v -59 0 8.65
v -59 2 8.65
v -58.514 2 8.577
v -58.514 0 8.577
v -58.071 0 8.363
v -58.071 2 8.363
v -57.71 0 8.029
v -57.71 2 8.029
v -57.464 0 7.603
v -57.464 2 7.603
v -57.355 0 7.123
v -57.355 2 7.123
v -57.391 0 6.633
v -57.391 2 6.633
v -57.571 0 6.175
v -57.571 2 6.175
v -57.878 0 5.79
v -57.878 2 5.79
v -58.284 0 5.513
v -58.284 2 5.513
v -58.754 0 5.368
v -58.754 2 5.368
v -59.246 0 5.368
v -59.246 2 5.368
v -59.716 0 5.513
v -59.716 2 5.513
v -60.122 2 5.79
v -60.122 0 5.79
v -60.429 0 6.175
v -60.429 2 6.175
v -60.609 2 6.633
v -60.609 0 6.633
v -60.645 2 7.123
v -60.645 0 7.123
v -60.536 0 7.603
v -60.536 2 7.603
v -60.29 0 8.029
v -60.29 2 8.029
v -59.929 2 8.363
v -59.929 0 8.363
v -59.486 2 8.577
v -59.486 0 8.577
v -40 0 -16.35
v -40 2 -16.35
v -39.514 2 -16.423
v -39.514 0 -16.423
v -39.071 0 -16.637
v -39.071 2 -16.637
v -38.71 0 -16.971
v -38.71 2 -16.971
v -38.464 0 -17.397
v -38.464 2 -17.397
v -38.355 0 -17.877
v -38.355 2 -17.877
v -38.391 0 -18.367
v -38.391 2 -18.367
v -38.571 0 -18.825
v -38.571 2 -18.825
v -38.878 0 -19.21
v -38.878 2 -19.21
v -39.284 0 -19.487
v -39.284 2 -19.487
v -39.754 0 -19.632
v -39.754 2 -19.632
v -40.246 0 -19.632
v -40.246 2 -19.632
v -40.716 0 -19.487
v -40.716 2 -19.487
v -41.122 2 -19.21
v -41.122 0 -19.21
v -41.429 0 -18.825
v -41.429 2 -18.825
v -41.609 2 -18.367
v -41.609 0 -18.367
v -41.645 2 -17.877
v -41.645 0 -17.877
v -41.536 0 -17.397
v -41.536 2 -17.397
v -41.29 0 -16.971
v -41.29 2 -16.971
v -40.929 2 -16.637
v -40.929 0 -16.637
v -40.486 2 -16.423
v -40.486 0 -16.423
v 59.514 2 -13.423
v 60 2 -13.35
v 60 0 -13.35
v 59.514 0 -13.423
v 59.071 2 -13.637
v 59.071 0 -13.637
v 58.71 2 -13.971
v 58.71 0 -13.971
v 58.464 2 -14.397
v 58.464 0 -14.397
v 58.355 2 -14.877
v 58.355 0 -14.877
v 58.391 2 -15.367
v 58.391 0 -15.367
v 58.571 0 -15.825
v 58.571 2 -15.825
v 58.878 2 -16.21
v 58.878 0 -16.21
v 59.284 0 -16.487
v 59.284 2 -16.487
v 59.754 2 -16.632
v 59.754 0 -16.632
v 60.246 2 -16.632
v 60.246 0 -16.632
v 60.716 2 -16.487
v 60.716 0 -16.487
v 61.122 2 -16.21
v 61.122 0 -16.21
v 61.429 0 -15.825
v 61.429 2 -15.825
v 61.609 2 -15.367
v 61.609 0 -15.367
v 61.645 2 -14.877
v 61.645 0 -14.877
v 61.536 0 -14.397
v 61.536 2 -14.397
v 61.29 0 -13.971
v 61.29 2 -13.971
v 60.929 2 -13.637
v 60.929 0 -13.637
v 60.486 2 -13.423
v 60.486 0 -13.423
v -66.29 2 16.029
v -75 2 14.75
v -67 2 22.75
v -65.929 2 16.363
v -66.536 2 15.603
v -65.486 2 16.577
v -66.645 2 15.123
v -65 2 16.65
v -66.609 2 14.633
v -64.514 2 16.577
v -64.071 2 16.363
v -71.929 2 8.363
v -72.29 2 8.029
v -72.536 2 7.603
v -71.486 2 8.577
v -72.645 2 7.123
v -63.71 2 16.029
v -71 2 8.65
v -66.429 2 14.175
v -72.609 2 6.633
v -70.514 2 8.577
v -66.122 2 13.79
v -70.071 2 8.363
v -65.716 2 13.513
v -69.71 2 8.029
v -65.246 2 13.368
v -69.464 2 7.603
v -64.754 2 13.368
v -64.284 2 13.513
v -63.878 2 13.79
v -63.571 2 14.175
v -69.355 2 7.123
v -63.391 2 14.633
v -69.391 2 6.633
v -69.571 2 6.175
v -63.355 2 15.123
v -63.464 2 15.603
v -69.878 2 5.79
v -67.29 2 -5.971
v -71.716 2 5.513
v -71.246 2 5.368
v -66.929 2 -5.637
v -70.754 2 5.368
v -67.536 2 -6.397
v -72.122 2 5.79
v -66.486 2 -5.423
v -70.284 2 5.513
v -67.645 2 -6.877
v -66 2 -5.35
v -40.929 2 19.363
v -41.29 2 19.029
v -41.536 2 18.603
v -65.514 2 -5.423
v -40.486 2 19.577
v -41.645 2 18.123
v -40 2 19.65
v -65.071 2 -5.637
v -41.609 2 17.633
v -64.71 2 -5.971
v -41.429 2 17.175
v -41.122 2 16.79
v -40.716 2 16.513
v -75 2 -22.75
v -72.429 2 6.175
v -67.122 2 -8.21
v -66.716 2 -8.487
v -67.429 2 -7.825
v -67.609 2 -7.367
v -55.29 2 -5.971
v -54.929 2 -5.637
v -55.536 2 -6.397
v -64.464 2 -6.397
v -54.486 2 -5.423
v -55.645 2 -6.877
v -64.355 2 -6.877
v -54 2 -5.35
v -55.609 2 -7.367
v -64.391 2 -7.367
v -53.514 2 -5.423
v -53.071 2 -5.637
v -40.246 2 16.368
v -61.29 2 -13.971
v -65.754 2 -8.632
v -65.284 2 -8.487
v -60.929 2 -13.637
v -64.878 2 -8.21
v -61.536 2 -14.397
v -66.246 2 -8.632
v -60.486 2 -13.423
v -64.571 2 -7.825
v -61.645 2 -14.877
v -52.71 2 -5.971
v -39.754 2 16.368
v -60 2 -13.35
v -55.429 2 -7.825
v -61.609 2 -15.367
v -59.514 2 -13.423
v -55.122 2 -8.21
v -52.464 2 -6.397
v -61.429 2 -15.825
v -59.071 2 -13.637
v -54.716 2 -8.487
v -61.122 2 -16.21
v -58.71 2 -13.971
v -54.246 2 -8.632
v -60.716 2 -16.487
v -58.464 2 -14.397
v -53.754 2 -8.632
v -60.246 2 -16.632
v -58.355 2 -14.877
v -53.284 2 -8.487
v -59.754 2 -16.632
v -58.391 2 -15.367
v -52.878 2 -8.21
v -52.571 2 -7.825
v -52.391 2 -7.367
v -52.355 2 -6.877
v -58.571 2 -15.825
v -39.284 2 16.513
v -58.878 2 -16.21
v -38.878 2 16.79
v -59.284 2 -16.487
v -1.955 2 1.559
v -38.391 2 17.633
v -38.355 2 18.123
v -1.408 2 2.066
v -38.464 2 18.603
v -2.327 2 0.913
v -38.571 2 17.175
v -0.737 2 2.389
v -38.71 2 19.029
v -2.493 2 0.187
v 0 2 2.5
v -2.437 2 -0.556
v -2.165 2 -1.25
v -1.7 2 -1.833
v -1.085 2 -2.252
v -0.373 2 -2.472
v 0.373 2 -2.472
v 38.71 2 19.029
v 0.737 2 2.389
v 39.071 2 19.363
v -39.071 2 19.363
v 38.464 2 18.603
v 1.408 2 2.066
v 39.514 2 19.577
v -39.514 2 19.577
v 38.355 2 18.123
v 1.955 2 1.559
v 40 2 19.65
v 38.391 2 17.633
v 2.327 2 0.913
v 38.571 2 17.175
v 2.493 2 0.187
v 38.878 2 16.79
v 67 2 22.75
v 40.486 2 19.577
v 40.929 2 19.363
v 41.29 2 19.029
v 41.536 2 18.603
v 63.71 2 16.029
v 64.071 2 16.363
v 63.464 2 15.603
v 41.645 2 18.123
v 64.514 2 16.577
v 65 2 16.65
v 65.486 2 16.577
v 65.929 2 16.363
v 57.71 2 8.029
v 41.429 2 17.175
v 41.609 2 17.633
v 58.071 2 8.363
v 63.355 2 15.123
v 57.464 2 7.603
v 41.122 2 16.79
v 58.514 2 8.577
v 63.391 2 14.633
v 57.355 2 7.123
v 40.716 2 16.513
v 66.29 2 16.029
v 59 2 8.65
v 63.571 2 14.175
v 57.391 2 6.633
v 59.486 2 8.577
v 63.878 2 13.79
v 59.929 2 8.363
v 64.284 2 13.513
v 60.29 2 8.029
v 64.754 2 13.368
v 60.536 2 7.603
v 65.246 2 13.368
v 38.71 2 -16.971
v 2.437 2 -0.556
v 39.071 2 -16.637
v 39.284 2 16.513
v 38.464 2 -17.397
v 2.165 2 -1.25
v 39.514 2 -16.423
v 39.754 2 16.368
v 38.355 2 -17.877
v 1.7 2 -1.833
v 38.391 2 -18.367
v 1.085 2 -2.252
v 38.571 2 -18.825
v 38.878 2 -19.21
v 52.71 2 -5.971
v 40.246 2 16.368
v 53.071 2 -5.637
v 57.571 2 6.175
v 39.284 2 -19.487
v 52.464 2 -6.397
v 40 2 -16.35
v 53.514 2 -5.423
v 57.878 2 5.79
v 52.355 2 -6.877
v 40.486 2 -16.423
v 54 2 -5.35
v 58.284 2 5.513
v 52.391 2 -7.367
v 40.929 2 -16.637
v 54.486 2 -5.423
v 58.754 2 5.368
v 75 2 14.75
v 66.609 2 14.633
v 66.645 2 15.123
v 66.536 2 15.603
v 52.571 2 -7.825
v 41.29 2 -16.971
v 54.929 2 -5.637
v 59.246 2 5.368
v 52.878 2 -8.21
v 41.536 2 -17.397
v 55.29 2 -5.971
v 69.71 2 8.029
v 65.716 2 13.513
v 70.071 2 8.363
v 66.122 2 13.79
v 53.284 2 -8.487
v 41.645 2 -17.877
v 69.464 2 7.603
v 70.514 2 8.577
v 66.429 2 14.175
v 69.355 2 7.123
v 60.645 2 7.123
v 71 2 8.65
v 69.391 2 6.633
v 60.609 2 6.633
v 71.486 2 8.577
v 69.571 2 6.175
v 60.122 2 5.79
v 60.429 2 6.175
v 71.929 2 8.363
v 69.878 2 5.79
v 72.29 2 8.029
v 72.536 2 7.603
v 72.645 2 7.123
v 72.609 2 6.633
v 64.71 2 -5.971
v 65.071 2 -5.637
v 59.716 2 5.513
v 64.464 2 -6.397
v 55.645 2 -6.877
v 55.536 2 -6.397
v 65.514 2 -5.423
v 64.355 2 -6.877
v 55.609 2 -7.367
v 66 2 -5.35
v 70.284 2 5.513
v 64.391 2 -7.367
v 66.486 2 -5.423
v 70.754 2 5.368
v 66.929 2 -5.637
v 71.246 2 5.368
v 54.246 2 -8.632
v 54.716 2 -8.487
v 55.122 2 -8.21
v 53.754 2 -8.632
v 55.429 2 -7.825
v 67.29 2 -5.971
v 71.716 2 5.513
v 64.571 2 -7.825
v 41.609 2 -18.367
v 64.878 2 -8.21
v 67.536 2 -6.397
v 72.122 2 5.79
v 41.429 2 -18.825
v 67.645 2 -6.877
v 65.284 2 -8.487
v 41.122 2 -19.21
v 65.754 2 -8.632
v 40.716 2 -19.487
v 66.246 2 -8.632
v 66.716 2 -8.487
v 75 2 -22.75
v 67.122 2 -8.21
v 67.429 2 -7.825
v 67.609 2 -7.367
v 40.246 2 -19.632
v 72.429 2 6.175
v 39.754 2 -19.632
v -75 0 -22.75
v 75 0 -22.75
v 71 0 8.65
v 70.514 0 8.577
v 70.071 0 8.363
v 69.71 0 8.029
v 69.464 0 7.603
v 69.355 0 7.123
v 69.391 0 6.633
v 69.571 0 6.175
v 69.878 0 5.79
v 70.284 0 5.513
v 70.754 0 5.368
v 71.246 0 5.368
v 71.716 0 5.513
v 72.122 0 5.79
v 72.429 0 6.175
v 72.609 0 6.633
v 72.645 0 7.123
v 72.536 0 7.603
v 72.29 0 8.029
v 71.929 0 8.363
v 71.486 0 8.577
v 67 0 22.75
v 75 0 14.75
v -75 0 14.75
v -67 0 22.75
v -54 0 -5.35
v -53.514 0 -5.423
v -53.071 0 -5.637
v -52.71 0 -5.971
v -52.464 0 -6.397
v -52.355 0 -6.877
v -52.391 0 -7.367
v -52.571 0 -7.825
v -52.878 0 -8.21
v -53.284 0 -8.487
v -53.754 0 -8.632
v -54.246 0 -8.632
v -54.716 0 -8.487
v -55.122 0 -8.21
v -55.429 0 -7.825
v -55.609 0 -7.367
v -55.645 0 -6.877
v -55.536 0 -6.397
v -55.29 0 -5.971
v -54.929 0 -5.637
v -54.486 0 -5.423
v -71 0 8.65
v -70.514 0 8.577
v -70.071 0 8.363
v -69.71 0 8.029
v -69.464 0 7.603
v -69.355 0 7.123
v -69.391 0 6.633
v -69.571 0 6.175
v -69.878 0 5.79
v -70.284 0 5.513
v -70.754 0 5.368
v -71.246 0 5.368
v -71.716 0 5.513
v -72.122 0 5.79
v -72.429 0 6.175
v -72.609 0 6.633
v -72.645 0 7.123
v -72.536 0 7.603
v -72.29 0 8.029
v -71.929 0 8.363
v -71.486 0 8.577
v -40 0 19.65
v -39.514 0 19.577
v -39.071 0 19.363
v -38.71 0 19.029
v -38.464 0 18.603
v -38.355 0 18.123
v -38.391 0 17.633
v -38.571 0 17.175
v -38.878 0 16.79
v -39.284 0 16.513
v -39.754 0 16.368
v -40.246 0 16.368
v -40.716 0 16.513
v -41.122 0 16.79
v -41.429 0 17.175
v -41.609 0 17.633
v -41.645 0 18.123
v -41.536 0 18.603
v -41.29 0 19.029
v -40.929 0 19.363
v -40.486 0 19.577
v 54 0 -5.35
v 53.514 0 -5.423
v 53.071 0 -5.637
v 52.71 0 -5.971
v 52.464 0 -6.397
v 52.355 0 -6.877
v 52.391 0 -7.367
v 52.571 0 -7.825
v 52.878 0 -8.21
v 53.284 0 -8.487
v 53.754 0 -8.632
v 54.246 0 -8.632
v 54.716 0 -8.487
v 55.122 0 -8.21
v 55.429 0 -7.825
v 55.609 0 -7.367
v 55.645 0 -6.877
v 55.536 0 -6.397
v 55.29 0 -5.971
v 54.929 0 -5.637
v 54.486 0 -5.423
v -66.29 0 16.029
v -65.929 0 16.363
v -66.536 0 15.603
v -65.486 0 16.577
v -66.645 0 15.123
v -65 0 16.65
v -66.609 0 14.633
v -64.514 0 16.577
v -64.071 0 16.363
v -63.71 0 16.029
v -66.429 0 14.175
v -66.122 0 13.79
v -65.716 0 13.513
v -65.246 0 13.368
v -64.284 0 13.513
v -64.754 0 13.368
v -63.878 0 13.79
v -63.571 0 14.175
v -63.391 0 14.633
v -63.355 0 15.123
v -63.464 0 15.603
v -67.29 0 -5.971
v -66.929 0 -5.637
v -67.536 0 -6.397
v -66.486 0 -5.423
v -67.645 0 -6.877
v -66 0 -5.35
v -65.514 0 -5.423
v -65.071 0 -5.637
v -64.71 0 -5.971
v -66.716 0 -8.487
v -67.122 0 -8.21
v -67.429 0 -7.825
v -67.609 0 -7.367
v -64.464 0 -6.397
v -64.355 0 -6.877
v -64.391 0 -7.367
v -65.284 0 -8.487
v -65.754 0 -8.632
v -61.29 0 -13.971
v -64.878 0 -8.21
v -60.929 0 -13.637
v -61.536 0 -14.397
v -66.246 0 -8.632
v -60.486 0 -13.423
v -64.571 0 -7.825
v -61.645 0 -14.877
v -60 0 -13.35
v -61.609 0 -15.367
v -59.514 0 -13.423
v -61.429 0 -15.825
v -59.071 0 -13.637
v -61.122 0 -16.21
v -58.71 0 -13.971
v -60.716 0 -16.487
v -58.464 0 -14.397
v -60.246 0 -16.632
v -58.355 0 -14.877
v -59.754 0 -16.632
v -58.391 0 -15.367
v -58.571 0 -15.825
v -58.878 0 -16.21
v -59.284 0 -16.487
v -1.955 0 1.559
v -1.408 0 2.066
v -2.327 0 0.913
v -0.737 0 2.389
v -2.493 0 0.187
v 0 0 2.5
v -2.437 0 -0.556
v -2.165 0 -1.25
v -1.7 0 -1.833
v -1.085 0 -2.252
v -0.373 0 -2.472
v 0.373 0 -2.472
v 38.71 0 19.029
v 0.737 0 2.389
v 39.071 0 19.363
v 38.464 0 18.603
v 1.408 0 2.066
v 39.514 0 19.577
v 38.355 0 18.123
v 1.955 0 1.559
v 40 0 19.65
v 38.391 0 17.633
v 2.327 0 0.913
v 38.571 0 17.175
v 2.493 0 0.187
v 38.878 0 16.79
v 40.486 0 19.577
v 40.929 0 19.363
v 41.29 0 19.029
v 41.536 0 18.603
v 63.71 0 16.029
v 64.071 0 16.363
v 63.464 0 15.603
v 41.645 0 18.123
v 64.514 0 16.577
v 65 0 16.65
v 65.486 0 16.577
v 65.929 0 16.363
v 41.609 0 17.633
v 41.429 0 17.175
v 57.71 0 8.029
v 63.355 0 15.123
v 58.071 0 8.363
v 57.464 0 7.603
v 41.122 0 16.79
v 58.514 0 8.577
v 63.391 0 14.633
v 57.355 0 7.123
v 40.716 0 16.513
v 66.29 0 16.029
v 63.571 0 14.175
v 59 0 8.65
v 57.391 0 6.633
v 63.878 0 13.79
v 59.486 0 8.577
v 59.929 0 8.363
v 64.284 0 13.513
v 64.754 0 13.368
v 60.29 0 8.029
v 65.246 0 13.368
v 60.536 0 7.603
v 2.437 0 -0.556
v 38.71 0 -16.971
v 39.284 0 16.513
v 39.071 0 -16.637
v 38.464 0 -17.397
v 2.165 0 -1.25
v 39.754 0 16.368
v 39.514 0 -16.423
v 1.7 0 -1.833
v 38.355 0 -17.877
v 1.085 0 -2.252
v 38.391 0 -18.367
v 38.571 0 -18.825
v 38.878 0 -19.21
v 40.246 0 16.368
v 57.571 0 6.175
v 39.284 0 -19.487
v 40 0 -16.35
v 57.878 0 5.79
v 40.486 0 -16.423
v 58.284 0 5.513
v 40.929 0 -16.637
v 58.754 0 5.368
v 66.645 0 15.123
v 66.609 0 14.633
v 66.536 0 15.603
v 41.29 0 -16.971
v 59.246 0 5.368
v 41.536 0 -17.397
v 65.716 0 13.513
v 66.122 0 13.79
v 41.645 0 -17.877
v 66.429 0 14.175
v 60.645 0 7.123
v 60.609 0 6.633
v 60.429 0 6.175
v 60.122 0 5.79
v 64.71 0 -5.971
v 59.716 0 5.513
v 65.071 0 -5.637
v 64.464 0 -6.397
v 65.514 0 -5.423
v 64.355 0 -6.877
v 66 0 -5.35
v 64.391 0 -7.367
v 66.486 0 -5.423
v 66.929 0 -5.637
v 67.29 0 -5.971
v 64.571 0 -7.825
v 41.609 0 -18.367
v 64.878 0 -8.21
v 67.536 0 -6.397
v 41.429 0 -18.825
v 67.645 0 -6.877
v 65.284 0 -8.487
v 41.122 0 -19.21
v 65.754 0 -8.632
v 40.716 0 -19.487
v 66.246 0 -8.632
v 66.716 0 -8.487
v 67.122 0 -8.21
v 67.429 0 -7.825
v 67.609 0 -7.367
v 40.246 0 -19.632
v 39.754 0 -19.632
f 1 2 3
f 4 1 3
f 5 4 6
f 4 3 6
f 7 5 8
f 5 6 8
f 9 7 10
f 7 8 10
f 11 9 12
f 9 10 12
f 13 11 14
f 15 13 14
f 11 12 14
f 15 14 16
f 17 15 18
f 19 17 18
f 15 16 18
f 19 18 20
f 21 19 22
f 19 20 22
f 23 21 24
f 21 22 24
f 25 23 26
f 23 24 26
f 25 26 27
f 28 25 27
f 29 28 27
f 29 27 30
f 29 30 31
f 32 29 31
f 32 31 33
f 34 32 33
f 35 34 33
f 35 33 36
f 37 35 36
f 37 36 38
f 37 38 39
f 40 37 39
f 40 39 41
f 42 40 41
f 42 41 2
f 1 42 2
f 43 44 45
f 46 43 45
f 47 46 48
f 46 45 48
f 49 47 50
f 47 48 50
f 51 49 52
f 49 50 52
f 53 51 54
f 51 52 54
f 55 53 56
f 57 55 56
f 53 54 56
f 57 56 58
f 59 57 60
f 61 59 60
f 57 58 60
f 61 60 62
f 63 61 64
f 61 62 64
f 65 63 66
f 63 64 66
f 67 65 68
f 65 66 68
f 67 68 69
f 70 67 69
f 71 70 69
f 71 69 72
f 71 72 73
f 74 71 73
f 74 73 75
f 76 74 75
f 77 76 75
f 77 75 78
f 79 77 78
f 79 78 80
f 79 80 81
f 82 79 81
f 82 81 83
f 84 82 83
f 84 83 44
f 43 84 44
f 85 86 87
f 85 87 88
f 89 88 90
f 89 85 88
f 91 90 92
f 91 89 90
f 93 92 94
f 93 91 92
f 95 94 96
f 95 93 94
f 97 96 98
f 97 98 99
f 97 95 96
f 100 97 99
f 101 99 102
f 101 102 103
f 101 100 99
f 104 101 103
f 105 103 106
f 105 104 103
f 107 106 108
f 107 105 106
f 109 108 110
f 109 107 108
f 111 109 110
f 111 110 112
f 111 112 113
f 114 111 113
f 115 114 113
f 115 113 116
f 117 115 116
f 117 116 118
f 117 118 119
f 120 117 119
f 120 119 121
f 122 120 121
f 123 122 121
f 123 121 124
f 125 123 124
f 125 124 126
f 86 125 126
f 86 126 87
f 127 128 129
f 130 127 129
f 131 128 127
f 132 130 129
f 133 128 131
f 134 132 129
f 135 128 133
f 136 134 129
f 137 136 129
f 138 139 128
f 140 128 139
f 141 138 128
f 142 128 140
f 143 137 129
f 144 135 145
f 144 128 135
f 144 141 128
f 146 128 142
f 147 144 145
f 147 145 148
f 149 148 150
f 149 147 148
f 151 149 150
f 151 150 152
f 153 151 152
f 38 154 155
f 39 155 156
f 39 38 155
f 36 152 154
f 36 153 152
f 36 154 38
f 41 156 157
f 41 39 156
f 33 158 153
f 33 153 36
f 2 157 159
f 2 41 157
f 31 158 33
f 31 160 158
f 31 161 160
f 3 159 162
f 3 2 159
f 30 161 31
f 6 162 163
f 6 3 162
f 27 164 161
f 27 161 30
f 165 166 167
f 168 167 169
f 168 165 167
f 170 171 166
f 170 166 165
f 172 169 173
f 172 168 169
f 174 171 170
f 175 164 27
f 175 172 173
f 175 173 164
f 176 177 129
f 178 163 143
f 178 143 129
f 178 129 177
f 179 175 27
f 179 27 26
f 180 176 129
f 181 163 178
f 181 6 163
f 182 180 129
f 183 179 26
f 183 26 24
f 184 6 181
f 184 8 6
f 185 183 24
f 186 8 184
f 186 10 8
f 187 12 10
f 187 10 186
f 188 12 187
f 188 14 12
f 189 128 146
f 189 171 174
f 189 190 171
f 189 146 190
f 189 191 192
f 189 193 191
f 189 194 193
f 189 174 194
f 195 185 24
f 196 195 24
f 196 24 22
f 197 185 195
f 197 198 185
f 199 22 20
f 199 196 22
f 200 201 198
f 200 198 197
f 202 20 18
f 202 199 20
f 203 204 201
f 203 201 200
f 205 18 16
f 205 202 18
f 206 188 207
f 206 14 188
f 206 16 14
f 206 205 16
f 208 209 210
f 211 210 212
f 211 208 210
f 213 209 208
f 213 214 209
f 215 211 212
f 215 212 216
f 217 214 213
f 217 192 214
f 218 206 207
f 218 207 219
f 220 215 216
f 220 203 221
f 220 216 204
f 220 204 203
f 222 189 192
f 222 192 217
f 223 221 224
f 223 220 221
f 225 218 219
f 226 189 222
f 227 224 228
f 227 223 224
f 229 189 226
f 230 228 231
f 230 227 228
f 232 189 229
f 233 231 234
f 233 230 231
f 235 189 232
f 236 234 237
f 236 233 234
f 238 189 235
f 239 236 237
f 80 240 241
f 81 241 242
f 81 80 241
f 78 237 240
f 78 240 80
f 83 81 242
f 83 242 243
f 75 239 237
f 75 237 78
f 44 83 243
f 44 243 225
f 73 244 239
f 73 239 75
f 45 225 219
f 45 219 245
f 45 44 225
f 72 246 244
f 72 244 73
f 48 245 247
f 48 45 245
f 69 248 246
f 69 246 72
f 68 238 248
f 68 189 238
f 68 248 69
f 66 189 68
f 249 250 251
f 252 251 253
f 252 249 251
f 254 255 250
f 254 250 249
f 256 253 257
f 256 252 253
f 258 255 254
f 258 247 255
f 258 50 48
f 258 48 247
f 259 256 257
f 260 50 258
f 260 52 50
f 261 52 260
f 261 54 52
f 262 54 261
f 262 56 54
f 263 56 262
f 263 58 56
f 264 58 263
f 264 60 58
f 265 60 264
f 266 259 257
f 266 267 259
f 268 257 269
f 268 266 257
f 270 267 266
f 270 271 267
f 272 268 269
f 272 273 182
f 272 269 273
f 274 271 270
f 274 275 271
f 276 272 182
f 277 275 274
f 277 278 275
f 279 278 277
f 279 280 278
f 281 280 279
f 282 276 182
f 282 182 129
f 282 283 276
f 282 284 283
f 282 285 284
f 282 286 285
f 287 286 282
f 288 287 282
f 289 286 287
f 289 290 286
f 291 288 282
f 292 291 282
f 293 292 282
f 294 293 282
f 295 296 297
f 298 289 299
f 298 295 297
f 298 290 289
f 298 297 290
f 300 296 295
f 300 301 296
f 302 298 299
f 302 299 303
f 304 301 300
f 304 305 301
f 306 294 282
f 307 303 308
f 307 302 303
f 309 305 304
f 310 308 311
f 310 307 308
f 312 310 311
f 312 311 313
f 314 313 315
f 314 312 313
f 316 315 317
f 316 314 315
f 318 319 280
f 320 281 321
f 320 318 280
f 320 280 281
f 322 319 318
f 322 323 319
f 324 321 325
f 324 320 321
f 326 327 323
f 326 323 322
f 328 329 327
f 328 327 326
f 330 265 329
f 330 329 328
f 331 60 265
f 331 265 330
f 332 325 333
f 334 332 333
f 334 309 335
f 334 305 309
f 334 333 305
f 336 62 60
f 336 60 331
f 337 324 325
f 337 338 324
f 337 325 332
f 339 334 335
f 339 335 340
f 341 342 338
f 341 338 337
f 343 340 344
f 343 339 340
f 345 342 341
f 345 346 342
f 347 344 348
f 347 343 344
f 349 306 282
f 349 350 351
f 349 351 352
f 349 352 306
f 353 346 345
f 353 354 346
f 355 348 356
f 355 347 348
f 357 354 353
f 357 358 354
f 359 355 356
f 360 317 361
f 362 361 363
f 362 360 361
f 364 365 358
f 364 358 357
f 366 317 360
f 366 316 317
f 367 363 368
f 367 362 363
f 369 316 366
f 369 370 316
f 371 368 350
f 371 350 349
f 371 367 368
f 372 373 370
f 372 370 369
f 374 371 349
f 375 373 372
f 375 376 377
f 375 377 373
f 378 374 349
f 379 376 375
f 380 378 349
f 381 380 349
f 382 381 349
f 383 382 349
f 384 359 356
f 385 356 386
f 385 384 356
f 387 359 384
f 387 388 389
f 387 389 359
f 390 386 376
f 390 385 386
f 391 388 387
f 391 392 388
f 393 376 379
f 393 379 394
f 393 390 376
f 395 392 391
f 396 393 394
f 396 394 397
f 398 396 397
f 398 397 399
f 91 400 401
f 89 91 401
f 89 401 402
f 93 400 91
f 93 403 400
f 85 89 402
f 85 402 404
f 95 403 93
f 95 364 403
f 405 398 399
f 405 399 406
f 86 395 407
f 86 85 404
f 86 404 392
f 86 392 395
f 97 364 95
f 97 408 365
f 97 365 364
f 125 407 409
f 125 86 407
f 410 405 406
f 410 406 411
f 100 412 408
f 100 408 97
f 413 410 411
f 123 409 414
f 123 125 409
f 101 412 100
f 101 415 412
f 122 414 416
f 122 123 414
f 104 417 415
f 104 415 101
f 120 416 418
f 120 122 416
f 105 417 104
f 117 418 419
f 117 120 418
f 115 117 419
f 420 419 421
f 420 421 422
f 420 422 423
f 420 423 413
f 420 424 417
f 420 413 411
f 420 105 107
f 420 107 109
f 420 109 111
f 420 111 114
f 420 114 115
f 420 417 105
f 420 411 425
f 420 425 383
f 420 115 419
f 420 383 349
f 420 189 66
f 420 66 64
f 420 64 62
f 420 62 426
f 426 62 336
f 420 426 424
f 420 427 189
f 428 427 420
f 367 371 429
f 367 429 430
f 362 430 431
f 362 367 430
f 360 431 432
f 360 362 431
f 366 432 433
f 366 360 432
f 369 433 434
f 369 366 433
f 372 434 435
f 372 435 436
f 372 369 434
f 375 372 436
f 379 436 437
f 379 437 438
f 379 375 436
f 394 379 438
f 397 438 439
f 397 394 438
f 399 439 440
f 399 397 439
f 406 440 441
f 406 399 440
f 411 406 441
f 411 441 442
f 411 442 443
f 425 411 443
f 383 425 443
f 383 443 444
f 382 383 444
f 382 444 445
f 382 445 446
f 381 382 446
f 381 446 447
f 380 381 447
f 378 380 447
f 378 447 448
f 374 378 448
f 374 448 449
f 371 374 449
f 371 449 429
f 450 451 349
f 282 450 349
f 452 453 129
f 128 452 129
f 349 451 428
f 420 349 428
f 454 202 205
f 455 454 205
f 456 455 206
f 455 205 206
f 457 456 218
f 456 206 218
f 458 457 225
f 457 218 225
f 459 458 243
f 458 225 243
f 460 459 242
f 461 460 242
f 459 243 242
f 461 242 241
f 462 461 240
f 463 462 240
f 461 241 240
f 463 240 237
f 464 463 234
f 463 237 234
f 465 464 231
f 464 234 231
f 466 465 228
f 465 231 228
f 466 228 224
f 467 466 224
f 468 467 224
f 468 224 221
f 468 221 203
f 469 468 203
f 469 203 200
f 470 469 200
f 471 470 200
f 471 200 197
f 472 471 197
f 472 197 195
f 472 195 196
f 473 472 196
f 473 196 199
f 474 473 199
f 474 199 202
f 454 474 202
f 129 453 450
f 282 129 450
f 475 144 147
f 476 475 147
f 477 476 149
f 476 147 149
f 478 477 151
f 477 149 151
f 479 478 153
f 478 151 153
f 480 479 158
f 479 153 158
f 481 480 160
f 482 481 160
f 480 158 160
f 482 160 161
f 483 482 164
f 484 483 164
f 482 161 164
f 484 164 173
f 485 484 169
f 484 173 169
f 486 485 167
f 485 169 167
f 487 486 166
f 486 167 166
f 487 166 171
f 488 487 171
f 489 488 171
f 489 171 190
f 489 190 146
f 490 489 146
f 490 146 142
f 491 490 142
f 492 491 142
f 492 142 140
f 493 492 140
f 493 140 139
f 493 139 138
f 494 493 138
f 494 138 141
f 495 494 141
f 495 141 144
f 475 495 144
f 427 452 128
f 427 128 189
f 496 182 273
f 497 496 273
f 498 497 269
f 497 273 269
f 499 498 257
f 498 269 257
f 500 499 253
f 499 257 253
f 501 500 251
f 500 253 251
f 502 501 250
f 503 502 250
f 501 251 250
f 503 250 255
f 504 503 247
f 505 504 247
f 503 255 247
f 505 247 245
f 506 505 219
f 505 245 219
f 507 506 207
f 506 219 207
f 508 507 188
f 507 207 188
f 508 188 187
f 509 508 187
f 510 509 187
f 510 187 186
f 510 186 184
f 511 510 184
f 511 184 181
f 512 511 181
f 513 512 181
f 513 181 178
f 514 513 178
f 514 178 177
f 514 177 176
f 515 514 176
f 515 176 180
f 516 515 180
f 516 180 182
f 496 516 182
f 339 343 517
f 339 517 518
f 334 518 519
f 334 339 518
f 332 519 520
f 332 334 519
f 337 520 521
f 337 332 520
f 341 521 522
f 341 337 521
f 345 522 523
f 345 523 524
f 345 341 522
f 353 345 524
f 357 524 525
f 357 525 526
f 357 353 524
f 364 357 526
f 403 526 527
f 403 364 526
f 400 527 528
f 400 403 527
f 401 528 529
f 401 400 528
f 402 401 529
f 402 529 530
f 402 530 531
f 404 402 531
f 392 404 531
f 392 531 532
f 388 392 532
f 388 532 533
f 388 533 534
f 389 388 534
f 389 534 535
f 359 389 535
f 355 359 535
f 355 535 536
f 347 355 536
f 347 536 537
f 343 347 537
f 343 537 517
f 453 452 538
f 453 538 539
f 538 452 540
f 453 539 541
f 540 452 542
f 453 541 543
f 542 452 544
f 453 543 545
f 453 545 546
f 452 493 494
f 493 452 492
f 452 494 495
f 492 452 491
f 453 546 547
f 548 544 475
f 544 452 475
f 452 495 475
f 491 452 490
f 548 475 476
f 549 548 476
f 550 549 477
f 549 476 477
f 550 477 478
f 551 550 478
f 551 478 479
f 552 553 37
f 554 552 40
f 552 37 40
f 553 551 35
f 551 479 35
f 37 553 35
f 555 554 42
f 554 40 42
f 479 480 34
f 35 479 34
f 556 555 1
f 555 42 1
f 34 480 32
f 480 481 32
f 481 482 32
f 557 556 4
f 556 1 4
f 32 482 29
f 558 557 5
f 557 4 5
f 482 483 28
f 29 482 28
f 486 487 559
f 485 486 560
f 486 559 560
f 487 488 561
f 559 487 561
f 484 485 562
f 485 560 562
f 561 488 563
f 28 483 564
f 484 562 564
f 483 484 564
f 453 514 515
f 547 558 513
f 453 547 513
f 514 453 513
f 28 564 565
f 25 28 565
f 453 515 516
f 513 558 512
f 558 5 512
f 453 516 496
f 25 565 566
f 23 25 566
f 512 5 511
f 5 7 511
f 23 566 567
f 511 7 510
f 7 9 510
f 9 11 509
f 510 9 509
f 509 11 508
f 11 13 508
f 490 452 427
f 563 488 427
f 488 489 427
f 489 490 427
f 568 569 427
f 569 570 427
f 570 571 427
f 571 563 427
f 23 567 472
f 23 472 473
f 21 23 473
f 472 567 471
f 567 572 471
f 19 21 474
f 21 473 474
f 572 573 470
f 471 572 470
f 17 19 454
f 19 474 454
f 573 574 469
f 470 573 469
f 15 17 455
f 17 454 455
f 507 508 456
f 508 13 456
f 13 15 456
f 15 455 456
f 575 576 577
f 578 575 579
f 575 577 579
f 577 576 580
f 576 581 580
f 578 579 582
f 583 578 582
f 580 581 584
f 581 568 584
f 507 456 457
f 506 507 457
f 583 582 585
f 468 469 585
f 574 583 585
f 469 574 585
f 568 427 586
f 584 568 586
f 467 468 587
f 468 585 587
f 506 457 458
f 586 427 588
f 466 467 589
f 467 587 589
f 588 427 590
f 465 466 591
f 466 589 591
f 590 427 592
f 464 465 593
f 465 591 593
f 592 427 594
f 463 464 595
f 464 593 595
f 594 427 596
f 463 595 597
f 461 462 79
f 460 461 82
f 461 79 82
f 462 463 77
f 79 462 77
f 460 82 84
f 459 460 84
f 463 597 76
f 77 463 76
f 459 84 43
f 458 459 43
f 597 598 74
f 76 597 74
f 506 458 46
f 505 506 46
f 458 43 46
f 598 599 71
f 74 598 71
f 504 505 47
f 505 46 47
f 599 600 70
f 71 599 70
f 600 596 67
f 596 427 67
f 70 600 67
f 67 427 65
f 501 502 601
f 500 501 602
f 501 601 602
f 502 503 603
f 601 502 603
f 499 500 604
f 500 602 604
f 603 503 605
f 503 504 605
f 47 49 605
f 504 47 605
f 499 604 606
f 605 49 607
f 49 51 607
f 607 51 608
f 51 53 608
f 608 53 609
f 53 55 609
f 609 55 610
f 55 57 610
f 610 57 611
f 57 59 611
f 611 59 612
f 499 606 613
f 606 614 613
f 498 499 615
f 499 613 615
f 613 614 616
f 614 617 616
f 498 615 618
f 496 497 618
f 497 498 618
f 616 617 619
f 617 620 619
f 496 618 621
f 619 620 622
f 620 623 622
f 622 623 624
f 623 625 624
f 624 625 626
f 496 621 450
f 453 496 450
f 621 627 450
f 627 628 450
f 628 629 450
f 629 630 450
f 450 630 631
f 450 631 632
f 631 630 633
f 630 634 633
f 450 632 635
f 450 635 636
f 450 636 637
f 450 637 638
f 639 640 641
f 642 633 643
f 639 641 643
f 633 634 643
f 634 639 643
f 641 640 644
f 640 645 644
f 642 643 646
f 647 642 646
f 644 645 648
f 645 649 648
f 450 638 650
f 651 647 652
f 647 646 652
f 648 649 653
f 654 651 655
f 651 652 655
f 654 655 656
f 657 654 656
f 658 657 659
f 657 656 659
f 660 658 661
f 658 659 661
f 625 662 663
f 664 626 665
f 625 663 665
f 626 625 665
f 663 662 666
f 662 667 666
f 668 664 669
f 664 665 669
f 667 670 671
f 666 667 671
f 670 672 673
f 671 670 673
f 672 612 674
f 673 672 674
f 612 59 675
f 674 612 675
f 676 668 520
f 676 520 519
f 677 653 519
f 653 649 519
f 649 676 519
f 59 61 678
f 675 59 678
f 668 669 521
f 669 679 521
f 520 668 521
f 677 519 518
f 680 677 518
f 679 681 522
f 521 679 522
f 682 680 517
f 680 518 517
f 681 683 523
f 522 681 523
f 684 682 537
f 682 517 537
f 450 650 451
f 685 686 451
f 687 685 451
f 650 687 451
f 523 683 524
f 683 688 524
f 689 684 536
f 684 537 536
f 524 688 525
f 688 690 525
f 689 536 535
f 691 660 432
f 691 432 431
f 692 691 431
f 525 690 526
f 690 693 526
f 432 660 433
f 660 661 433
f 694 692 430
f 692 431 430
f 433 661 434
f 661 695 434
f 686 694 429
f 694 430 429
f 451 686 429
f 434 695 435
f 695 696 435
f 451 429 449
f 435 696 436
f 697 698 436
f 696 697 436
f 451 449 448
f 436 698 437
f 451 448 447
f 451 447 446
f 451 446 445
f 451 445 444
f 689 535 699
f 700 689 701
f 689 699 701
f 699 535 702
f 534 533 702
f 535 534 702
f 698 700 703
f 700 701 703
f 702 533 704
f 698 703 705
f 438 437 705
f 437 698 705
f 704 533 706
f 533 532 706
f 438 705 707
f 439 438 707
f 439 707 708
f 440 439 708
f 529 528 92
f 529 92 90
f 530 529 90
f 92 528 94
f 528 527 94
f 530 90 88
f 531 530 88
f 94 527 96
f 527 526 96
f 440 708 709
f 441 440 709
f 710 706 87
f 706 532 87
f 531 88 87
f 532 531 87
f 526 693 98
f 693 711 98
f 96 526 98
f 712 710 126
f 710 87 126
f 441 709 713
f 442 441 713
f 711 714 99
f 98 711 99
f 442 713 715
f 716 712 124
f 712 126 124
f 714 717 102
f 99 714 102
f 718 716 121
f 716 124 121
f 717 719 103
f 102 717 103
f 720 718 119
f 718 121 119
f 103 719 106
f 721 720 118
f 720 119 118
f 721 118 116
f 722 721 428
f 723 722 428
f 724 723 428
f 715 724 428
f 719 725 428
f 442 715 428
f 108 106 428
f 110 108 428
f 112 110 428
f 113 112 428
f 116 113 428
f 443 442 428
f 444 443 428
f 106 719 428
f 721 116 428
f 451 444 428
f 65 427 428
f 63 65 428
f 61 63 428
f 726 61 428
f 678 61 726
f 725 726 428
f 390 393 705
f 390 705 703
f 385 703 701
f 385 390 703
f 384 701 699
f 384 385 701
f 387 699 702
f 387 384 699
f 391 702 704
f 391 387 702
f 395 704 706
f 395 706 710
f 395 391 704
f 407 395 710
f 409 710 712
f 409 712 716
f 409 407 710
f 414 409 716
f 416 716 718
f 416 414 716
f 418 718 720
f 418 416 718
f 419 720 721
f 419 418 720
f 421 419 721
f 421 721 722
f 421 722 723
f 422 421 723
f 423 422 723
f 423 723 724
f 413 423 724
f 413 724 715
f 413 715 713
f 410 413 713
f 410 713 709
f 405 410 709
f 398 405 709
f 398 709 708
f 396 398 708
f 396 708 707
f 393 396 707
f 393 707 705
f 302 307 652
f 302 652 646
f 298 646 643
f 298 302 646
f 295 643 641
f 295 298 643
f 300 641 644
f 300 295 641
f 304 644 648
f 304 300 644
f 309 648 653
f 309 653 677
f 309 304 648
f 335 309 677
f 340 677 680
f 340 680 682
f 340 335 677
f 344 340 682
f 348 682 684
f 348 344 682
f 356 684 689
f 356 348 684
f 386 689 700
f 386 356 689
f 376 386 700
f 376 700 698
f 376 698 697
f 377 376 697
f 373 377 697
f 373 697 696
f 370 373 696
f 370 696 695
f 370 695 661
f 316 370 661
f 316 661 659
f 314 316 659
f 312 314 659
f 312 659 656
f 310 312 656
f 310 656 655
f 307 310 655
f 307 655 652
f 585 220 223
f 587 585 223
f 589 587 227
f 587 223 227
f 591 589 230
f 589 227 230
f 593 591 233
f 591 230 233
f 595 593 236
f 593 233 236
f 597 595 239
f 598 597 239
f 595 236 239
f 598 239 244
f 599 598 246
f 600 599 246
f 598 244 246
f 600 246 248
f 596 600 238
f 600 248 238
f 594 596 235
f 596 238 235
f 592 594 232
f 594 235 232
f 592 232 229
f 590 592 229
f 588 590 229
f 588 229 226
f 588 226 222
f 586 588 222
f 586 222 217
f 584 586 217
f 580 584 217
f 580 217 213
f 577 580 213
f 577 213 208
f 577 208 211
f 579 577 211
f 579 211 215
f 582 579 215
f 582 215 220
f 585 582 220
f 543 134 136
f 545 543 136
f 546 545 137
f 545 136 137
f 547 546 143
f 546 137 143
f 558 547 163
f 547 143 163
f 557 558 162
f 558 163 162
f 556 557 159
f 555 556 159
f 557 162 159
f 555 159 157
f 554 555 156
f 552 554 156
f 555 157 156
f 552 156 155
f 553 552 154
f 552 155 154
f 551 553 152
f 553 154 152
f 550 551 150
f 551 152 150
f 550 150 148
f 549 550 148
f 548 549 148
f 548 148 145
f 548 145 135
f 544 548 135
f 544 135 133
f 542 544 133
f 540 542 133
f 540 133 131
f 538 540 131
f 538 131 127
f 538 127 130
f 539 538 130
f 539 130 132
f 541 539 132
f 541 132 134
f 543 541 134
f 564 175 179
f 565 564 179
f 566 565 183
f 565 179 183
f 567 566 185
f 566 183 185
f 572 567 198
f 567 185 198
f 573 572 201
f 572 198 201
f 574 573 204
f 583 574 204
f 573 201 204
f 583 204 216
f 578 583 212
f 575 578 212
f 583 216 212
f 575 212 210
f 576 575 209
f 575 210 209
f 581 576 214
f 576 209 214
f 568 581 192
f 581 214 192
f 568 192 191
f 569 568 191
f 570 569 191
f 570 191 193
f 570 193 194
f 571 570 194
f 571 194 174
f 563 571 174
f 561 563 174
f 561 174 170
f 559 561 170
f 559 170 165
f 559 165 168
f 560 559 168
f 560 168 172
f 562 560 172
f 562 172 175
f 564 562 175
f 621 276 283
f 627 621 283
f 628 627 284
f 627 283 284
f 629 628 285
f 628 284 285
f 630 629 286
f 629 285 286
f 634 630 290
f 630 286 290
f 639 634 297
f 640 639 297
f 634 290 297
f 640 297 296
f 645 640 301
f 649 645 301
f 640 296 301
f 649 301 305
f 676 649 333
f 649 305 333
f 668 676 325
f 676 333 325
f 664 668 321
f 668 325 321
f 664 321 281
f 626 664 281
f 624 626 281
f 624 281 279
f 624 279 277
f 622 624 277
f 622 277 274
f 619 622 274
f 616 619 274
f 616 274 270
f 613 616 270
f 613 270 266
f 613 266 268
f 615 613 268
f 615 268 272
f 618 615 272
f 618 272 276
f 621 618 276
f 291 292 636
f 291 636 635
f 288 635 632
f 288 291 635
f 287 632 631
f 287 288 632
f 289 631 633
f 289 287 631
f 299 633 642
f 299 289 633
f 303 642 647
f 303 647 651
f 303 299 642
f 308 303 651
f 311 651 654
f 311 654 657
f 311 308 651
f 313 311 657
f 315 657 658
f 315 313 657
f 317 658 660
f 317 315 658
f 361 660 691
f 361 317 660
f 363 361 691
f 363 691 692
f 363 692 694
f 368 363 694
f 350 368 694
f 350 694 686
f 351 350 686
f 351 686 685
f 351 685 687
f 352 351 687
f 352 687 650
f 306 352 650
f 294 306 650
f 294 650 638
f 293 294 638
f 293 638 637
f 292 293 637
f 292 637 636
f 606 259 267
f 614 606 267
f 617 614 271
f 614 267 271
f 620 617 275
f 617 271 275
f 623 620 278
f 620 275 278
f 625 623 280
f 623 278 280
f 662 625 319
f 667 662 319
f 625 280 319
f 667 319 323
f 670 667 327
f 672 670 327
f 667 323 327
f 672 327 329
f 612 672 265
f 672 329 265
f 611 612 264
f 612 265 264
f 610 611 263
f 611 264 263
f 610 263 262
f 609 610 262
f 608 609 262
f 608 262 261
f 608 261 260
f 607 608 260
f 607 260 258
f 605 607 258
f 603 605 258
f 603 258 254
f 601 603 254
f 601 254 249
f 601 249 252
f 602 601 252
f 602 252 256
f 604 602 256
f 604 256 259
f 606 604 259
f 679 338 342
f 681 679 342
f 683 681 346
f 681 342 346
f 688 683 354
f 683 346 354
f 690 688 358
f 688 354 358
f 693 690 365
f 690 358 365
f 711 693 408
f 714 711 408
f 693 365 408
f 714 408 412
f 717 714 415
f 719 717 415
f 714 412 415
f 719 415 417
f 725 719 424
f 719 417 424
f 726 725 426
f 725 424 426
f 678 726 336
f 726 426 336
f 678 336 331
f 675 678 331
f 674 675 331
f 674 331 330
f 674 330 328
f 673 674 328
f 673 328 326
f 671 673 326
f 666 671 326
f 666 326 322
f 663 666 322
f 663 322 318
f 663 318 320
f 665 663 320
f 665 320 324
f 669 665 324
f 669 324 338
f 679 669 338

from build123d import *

# Parameters (mm, degrees)
SKETCH_1_W             = 150
SKETCH_1_H             = 45.5
EXTRUDE_1_DEPTH        = 2
CUT_EXTRUDE_1_REACH    = 80.4
SKETCH_2_R             = 1.65
CHAMFER_1_SIZE         = 8
CUT_EXTRUDE_1137_REACH = 80.4
SKETCH_3_R             = 2.5
CUT_EXTRUDE_2_REACH    = 80.4
SKETCH_4_R             = 1.65


with BuildPart() as part:
    # 草图1 → 凸台-拉伸1 (new body)
    with BuildSketch(Plane(origin=(0, 0, 0), x_dir=(1, 0, 0), z_dir=(0, 1, 0))):
        Rectangle(SKETCH_1_W, SKETCH_1_H)
    extrude(amount=EXTRUDE_1_DEPTH)

    # 草图2 → 切除-拉伸1 (cut, up to next)
    with BuildSketch(Plane(origin=(0, 2, 0), x_dir=(1, 0, 0), z_dir=(0, 1, 0)), mode=Mode.PRIVATE) as cut_extrude_1_sk1:
        with Locations(Location((-60, 15, 0), (0, 0, 270))):
            Circle(SKETCH_2_R)
    cut_extrude_1_tool1 = extrude(cut_extrude_1_sk1.sketch, amount=-CUT_EXTRUDE_1_REACH, mode=Mode.PRIVATE) & part.part
    # 草图2 → 切除-拉伸1 (cut, up to next)
    with BuildSketch(Plane(origin=(0, 2, 0), x_dir=(1, 0, 0), z_dir=(0, 1, 0)), mode=Mode.PRIVATE) as cut_extrude_1_sk2:
        with Locations(Location((-66, 7, 0), (0, 0, 270))):
            Circle(SKETCH_2_R)
    cut_extrude_1_tool2 = extrude(cut_extrude_1_sk2.sketch, amount=-CUT_EXTRUDE_1_REACH, mode=Mode.PRIVATE) & part.part
    # 草图2 → 切除-拉伸1 (cut, up to next)
    with BuildSketch(Plane(origin=(0, 2, 0), x_dir=(1, 0, 0), z_dir=(0, 1, 0)), mode=Mode.PRIVATE) as cut_extrude_1_sk3:
        with Locations(Location((-54, 7, 0), (0, 0, 270))):
            Circle(SKETCH_2_R)
    cut_extrude_1_tool3 = extrude(cut_extrude_1_sk3.sketch, amount=-CUT_EXTRUDE_1_REACH, mode=Mode.PRIVATE) & part.part
    # 草图2 → 切除-拉伸1 (cut, up to next)
    with BuildSketch(Plane(origin=(0, 2, 0), x_dir=(1, 0, 0), z_dir=(0, 1, 0)), mode=Mode.PRIVATE) as cut_extrude_1_sk4:
        with Locations(Location((-71, -7, 0), (0, 0, 270))):
            Circle(SKETCH_2_R)
    cut_extrude_1_tool4 = extrude(cut_extrude_1_sk4.sketch, amount=-CUT_EXTRUDE_1_REACH, mode=Mode.PRIVATE) & part.part
    # 草图2 → 切除-拉伸1 (cut, up to next)
    with BuildSketch(Plane(origin=(0, 2, 0), x_dir=(1, 0, 0), z_dir=(0, 1, 0)), mode=Mode.PRIVATE) as cut_extrude_1_sk5:
        with Locations(Location((-59, -7, 0), (0, 0, 270))):
            Circle(SKETCH_2_R)
    cut_extrude_1_tool5 = extrude(cut_extrude_1_sk5.sketch, amount=-CUT_EXTRUDE_1_REACH, mode=Mode.PRIVATE) & part.part
    # 草图2 → 切除-拉伸1 (cut, up to next)
    with BuildSketch(Plane(origin=(0, 2, 0), x_dir=(1, 0, 0), z_dir=(0, 1, 0)), mode=Mode.PRIVATE) as cut_extrude_1_sk6:
        with Locations(Location((-65, -15, 0), (0, 0, 270))):
            Circle(SKETCH_2_R)
    cut_extrude_1_tool6 = extrude(cut_extrude_1_sk6.sketch, amount=-CUT_EXTRUDE_1_REACH, mode=Mode.PRIVATE) & part.part
    cut_extrude_1_1 = cut_extrude_1_tool1.solids().sort_by_distance((-60, 2, -15))[0]
    add(cut_extrude_1_1, mode=Mode.SUBTRACT)
    cut_extrude_1_2 = cut_extrude_1_tool2.solids().sort_by_distance((-66, 2, -7))[0]
    add(cut_extrude_1_2, mode=Mode.SUBTRACT)
    cut_extrude_1_3 = cut_extrude_1_tool3.solids().sort_by_distance((-54, 2, -7))[0]
    add(cut_extrude_1_3, mode=Mode.SUBTRACT)
    cut_extrude_1_4 = cut_extrude_1_tool4.solids().sort_by_distance((-71, 2, 7))[0]
    add(cut_extrude_1_4, mode=Mode.SUBTRACT)
    cut_extrude_1_5 = cut_extrude_1_tool5.solids().sort_by_distance((-59, 2, 7))[0]
    add(cut_extrude_1_5, mode=Mode.SUBTRACT)
    cut_extrude_1_6 = cut_extrude_1_tool6.solids().sort_by_distance((-65, 2, 15))[0]
    add(cut_extrude_1_6, mode=Mode.SUBTRACT)
    cut_extrude_1 = cut_extrude_1_1 + cut_extrude_1_2 + cut_extrude_1_3 + cut_extrude_1_4 + cut_extrude_1_5 + cut_extrude_1_6  # 切除-拉伸1 as one shape, for the pattern or mirror that repeats it

    # 镜向1: 切除-拉伸1 across plane
    add(cut_extrude_1.mirror(Plane(origin=(0, 0, 0), x_dir=(0, 0, 1), z_dir=(1, 0, 0))), mode=Mode.SUBTRACT)

    # 倒角1
    chamfer_1_edges = [part.edges().sort_by_distance(p)[0] for p in [
        (75, 1, 22.75),
        (-75, 1, 22.75),
    ]]
    chamfer(chamfer_1_edges, length=CHAMFER_1_SIZE)

    # 草图3 → Cut-Extrude 1137 (cut, up to next)
    with BuildSketch(Plane(origin=(0, 2, 0), x_dir=(1, 0, 0), z_dir=(0, 1, 0)), mode=Mode.PRIVATE) as cut_extrude_1137_sk1:
        with Locations(Location((0, 0, 0), (0, 0, 270))):
            Circle(SKETCH_3_R)
    cut_extrude_1137_tool1 = extrude(cut_extrude_1137_sk1.sketch, amount=-CUT_EXTRUDE_1137_REACH, mode=Mode.PRIVATE) & part.part
    add(cut_extrude_1137_tool1.solids().sort_by_distance((0, 2, 0))[0], mode=Mode.SUBTRACT)

    # 草图4 → 切除-拉伸2 (cut, up to next)
    with BuildSketch(Plane(origin=(0, 2, 0), x_dir=(1, 0, 0), z_dir=(0, 1, 0)), mode=Mode.PRIVATE) as cut_extrude_2_sk1:
        with Locations(Location((-40, 18, 0), (0, 0, 270))):
            Circle(SKETCH_4_R)
    cut_extrude_2_tool1 = extrude(cut_extrude_2_sk1.sketch, amount=-CUT_EXTRUDE_2_REACH, mode=Mode.PRIVATE) & part.part
    # 草图4 → 切除-拉伸2 (cut, up to next)
    with BuildSketch(Plane(origin=(0, 2, 0), x_dir=(1, 0, 0), z_dir=(0, 1, 0)), mode=Mode.PRIVATE) as cut_extrude_2_sk2:
        with Locations(Location((-40, -18, 0), (0, 0, 270))):
            Circle(SKETCH_4_R)
    cut_extrude_2_tool2 = extrude(cut_extrude_2_sk2.sketch, amount=-CUT_EXTRUDE_2_REACH, mode=Mode.PRIVATE) & part.part
    # 草图4 → 切除-拉伸2 (cut, up to next)
    with BuildSketch(Plane(origin=(0, 2, 0), x_dir=(1, 0, 0), z_dir=(0, 1, 0)), mode=Mode.PRIVATE) as cut_extrude_2_sk3:
        with Locations(Location((40, 18, 0), (0, 0, 270))):
            Circle(SKETCH_4_R)
    cut_extrude_2_tool3 = extrude(cut_extrude_2_sk3.sketch, amount=-CUT_EXTRUDE_2_REACH, mode=Mode.PRIVATE) & part.part
    # 草图4 → 切除-拉伸2 (cut, up to next)
    with BuildSketch(Plane(origin=(0, 2, 0), x_dir=(1, 0, 0), z_dir=(0, 1, 0)), mode=Mode.PRIVATE) as cut_extrude_2_sk4:
        with Locations(Location((40, -18, 0), (0, 0, 270))):
            Circle(SKETCH_4_R)
    cut_extrude_2_tool4 = extrude(cut_extrude_2_sk4.sketch, amount=-CUT_EXTRUDE_2_REACH, mode=Mode.PRIVATE) & part.part
    add(cut_extrude_2_tool1.solids().sort_by_distance((-40, 2, -18))[0], mode=Mode.SUBTRACT)
    add(cut_extrude_2_tool2.solids().sort_by_distance((-40, 2, 18))[0], mode=Mode.SUBTRACT)
    add(cut_extrude_2_tool3.solids().sort_by_distance((40, 2, -18))[0], mode=Mode.SUBTRACT)
    add(cut_extrude_2_tool4.solids().sort_by_distance((40, 2, 18))[0], mode=Mode.SUBTRACT)


solid = part.part
